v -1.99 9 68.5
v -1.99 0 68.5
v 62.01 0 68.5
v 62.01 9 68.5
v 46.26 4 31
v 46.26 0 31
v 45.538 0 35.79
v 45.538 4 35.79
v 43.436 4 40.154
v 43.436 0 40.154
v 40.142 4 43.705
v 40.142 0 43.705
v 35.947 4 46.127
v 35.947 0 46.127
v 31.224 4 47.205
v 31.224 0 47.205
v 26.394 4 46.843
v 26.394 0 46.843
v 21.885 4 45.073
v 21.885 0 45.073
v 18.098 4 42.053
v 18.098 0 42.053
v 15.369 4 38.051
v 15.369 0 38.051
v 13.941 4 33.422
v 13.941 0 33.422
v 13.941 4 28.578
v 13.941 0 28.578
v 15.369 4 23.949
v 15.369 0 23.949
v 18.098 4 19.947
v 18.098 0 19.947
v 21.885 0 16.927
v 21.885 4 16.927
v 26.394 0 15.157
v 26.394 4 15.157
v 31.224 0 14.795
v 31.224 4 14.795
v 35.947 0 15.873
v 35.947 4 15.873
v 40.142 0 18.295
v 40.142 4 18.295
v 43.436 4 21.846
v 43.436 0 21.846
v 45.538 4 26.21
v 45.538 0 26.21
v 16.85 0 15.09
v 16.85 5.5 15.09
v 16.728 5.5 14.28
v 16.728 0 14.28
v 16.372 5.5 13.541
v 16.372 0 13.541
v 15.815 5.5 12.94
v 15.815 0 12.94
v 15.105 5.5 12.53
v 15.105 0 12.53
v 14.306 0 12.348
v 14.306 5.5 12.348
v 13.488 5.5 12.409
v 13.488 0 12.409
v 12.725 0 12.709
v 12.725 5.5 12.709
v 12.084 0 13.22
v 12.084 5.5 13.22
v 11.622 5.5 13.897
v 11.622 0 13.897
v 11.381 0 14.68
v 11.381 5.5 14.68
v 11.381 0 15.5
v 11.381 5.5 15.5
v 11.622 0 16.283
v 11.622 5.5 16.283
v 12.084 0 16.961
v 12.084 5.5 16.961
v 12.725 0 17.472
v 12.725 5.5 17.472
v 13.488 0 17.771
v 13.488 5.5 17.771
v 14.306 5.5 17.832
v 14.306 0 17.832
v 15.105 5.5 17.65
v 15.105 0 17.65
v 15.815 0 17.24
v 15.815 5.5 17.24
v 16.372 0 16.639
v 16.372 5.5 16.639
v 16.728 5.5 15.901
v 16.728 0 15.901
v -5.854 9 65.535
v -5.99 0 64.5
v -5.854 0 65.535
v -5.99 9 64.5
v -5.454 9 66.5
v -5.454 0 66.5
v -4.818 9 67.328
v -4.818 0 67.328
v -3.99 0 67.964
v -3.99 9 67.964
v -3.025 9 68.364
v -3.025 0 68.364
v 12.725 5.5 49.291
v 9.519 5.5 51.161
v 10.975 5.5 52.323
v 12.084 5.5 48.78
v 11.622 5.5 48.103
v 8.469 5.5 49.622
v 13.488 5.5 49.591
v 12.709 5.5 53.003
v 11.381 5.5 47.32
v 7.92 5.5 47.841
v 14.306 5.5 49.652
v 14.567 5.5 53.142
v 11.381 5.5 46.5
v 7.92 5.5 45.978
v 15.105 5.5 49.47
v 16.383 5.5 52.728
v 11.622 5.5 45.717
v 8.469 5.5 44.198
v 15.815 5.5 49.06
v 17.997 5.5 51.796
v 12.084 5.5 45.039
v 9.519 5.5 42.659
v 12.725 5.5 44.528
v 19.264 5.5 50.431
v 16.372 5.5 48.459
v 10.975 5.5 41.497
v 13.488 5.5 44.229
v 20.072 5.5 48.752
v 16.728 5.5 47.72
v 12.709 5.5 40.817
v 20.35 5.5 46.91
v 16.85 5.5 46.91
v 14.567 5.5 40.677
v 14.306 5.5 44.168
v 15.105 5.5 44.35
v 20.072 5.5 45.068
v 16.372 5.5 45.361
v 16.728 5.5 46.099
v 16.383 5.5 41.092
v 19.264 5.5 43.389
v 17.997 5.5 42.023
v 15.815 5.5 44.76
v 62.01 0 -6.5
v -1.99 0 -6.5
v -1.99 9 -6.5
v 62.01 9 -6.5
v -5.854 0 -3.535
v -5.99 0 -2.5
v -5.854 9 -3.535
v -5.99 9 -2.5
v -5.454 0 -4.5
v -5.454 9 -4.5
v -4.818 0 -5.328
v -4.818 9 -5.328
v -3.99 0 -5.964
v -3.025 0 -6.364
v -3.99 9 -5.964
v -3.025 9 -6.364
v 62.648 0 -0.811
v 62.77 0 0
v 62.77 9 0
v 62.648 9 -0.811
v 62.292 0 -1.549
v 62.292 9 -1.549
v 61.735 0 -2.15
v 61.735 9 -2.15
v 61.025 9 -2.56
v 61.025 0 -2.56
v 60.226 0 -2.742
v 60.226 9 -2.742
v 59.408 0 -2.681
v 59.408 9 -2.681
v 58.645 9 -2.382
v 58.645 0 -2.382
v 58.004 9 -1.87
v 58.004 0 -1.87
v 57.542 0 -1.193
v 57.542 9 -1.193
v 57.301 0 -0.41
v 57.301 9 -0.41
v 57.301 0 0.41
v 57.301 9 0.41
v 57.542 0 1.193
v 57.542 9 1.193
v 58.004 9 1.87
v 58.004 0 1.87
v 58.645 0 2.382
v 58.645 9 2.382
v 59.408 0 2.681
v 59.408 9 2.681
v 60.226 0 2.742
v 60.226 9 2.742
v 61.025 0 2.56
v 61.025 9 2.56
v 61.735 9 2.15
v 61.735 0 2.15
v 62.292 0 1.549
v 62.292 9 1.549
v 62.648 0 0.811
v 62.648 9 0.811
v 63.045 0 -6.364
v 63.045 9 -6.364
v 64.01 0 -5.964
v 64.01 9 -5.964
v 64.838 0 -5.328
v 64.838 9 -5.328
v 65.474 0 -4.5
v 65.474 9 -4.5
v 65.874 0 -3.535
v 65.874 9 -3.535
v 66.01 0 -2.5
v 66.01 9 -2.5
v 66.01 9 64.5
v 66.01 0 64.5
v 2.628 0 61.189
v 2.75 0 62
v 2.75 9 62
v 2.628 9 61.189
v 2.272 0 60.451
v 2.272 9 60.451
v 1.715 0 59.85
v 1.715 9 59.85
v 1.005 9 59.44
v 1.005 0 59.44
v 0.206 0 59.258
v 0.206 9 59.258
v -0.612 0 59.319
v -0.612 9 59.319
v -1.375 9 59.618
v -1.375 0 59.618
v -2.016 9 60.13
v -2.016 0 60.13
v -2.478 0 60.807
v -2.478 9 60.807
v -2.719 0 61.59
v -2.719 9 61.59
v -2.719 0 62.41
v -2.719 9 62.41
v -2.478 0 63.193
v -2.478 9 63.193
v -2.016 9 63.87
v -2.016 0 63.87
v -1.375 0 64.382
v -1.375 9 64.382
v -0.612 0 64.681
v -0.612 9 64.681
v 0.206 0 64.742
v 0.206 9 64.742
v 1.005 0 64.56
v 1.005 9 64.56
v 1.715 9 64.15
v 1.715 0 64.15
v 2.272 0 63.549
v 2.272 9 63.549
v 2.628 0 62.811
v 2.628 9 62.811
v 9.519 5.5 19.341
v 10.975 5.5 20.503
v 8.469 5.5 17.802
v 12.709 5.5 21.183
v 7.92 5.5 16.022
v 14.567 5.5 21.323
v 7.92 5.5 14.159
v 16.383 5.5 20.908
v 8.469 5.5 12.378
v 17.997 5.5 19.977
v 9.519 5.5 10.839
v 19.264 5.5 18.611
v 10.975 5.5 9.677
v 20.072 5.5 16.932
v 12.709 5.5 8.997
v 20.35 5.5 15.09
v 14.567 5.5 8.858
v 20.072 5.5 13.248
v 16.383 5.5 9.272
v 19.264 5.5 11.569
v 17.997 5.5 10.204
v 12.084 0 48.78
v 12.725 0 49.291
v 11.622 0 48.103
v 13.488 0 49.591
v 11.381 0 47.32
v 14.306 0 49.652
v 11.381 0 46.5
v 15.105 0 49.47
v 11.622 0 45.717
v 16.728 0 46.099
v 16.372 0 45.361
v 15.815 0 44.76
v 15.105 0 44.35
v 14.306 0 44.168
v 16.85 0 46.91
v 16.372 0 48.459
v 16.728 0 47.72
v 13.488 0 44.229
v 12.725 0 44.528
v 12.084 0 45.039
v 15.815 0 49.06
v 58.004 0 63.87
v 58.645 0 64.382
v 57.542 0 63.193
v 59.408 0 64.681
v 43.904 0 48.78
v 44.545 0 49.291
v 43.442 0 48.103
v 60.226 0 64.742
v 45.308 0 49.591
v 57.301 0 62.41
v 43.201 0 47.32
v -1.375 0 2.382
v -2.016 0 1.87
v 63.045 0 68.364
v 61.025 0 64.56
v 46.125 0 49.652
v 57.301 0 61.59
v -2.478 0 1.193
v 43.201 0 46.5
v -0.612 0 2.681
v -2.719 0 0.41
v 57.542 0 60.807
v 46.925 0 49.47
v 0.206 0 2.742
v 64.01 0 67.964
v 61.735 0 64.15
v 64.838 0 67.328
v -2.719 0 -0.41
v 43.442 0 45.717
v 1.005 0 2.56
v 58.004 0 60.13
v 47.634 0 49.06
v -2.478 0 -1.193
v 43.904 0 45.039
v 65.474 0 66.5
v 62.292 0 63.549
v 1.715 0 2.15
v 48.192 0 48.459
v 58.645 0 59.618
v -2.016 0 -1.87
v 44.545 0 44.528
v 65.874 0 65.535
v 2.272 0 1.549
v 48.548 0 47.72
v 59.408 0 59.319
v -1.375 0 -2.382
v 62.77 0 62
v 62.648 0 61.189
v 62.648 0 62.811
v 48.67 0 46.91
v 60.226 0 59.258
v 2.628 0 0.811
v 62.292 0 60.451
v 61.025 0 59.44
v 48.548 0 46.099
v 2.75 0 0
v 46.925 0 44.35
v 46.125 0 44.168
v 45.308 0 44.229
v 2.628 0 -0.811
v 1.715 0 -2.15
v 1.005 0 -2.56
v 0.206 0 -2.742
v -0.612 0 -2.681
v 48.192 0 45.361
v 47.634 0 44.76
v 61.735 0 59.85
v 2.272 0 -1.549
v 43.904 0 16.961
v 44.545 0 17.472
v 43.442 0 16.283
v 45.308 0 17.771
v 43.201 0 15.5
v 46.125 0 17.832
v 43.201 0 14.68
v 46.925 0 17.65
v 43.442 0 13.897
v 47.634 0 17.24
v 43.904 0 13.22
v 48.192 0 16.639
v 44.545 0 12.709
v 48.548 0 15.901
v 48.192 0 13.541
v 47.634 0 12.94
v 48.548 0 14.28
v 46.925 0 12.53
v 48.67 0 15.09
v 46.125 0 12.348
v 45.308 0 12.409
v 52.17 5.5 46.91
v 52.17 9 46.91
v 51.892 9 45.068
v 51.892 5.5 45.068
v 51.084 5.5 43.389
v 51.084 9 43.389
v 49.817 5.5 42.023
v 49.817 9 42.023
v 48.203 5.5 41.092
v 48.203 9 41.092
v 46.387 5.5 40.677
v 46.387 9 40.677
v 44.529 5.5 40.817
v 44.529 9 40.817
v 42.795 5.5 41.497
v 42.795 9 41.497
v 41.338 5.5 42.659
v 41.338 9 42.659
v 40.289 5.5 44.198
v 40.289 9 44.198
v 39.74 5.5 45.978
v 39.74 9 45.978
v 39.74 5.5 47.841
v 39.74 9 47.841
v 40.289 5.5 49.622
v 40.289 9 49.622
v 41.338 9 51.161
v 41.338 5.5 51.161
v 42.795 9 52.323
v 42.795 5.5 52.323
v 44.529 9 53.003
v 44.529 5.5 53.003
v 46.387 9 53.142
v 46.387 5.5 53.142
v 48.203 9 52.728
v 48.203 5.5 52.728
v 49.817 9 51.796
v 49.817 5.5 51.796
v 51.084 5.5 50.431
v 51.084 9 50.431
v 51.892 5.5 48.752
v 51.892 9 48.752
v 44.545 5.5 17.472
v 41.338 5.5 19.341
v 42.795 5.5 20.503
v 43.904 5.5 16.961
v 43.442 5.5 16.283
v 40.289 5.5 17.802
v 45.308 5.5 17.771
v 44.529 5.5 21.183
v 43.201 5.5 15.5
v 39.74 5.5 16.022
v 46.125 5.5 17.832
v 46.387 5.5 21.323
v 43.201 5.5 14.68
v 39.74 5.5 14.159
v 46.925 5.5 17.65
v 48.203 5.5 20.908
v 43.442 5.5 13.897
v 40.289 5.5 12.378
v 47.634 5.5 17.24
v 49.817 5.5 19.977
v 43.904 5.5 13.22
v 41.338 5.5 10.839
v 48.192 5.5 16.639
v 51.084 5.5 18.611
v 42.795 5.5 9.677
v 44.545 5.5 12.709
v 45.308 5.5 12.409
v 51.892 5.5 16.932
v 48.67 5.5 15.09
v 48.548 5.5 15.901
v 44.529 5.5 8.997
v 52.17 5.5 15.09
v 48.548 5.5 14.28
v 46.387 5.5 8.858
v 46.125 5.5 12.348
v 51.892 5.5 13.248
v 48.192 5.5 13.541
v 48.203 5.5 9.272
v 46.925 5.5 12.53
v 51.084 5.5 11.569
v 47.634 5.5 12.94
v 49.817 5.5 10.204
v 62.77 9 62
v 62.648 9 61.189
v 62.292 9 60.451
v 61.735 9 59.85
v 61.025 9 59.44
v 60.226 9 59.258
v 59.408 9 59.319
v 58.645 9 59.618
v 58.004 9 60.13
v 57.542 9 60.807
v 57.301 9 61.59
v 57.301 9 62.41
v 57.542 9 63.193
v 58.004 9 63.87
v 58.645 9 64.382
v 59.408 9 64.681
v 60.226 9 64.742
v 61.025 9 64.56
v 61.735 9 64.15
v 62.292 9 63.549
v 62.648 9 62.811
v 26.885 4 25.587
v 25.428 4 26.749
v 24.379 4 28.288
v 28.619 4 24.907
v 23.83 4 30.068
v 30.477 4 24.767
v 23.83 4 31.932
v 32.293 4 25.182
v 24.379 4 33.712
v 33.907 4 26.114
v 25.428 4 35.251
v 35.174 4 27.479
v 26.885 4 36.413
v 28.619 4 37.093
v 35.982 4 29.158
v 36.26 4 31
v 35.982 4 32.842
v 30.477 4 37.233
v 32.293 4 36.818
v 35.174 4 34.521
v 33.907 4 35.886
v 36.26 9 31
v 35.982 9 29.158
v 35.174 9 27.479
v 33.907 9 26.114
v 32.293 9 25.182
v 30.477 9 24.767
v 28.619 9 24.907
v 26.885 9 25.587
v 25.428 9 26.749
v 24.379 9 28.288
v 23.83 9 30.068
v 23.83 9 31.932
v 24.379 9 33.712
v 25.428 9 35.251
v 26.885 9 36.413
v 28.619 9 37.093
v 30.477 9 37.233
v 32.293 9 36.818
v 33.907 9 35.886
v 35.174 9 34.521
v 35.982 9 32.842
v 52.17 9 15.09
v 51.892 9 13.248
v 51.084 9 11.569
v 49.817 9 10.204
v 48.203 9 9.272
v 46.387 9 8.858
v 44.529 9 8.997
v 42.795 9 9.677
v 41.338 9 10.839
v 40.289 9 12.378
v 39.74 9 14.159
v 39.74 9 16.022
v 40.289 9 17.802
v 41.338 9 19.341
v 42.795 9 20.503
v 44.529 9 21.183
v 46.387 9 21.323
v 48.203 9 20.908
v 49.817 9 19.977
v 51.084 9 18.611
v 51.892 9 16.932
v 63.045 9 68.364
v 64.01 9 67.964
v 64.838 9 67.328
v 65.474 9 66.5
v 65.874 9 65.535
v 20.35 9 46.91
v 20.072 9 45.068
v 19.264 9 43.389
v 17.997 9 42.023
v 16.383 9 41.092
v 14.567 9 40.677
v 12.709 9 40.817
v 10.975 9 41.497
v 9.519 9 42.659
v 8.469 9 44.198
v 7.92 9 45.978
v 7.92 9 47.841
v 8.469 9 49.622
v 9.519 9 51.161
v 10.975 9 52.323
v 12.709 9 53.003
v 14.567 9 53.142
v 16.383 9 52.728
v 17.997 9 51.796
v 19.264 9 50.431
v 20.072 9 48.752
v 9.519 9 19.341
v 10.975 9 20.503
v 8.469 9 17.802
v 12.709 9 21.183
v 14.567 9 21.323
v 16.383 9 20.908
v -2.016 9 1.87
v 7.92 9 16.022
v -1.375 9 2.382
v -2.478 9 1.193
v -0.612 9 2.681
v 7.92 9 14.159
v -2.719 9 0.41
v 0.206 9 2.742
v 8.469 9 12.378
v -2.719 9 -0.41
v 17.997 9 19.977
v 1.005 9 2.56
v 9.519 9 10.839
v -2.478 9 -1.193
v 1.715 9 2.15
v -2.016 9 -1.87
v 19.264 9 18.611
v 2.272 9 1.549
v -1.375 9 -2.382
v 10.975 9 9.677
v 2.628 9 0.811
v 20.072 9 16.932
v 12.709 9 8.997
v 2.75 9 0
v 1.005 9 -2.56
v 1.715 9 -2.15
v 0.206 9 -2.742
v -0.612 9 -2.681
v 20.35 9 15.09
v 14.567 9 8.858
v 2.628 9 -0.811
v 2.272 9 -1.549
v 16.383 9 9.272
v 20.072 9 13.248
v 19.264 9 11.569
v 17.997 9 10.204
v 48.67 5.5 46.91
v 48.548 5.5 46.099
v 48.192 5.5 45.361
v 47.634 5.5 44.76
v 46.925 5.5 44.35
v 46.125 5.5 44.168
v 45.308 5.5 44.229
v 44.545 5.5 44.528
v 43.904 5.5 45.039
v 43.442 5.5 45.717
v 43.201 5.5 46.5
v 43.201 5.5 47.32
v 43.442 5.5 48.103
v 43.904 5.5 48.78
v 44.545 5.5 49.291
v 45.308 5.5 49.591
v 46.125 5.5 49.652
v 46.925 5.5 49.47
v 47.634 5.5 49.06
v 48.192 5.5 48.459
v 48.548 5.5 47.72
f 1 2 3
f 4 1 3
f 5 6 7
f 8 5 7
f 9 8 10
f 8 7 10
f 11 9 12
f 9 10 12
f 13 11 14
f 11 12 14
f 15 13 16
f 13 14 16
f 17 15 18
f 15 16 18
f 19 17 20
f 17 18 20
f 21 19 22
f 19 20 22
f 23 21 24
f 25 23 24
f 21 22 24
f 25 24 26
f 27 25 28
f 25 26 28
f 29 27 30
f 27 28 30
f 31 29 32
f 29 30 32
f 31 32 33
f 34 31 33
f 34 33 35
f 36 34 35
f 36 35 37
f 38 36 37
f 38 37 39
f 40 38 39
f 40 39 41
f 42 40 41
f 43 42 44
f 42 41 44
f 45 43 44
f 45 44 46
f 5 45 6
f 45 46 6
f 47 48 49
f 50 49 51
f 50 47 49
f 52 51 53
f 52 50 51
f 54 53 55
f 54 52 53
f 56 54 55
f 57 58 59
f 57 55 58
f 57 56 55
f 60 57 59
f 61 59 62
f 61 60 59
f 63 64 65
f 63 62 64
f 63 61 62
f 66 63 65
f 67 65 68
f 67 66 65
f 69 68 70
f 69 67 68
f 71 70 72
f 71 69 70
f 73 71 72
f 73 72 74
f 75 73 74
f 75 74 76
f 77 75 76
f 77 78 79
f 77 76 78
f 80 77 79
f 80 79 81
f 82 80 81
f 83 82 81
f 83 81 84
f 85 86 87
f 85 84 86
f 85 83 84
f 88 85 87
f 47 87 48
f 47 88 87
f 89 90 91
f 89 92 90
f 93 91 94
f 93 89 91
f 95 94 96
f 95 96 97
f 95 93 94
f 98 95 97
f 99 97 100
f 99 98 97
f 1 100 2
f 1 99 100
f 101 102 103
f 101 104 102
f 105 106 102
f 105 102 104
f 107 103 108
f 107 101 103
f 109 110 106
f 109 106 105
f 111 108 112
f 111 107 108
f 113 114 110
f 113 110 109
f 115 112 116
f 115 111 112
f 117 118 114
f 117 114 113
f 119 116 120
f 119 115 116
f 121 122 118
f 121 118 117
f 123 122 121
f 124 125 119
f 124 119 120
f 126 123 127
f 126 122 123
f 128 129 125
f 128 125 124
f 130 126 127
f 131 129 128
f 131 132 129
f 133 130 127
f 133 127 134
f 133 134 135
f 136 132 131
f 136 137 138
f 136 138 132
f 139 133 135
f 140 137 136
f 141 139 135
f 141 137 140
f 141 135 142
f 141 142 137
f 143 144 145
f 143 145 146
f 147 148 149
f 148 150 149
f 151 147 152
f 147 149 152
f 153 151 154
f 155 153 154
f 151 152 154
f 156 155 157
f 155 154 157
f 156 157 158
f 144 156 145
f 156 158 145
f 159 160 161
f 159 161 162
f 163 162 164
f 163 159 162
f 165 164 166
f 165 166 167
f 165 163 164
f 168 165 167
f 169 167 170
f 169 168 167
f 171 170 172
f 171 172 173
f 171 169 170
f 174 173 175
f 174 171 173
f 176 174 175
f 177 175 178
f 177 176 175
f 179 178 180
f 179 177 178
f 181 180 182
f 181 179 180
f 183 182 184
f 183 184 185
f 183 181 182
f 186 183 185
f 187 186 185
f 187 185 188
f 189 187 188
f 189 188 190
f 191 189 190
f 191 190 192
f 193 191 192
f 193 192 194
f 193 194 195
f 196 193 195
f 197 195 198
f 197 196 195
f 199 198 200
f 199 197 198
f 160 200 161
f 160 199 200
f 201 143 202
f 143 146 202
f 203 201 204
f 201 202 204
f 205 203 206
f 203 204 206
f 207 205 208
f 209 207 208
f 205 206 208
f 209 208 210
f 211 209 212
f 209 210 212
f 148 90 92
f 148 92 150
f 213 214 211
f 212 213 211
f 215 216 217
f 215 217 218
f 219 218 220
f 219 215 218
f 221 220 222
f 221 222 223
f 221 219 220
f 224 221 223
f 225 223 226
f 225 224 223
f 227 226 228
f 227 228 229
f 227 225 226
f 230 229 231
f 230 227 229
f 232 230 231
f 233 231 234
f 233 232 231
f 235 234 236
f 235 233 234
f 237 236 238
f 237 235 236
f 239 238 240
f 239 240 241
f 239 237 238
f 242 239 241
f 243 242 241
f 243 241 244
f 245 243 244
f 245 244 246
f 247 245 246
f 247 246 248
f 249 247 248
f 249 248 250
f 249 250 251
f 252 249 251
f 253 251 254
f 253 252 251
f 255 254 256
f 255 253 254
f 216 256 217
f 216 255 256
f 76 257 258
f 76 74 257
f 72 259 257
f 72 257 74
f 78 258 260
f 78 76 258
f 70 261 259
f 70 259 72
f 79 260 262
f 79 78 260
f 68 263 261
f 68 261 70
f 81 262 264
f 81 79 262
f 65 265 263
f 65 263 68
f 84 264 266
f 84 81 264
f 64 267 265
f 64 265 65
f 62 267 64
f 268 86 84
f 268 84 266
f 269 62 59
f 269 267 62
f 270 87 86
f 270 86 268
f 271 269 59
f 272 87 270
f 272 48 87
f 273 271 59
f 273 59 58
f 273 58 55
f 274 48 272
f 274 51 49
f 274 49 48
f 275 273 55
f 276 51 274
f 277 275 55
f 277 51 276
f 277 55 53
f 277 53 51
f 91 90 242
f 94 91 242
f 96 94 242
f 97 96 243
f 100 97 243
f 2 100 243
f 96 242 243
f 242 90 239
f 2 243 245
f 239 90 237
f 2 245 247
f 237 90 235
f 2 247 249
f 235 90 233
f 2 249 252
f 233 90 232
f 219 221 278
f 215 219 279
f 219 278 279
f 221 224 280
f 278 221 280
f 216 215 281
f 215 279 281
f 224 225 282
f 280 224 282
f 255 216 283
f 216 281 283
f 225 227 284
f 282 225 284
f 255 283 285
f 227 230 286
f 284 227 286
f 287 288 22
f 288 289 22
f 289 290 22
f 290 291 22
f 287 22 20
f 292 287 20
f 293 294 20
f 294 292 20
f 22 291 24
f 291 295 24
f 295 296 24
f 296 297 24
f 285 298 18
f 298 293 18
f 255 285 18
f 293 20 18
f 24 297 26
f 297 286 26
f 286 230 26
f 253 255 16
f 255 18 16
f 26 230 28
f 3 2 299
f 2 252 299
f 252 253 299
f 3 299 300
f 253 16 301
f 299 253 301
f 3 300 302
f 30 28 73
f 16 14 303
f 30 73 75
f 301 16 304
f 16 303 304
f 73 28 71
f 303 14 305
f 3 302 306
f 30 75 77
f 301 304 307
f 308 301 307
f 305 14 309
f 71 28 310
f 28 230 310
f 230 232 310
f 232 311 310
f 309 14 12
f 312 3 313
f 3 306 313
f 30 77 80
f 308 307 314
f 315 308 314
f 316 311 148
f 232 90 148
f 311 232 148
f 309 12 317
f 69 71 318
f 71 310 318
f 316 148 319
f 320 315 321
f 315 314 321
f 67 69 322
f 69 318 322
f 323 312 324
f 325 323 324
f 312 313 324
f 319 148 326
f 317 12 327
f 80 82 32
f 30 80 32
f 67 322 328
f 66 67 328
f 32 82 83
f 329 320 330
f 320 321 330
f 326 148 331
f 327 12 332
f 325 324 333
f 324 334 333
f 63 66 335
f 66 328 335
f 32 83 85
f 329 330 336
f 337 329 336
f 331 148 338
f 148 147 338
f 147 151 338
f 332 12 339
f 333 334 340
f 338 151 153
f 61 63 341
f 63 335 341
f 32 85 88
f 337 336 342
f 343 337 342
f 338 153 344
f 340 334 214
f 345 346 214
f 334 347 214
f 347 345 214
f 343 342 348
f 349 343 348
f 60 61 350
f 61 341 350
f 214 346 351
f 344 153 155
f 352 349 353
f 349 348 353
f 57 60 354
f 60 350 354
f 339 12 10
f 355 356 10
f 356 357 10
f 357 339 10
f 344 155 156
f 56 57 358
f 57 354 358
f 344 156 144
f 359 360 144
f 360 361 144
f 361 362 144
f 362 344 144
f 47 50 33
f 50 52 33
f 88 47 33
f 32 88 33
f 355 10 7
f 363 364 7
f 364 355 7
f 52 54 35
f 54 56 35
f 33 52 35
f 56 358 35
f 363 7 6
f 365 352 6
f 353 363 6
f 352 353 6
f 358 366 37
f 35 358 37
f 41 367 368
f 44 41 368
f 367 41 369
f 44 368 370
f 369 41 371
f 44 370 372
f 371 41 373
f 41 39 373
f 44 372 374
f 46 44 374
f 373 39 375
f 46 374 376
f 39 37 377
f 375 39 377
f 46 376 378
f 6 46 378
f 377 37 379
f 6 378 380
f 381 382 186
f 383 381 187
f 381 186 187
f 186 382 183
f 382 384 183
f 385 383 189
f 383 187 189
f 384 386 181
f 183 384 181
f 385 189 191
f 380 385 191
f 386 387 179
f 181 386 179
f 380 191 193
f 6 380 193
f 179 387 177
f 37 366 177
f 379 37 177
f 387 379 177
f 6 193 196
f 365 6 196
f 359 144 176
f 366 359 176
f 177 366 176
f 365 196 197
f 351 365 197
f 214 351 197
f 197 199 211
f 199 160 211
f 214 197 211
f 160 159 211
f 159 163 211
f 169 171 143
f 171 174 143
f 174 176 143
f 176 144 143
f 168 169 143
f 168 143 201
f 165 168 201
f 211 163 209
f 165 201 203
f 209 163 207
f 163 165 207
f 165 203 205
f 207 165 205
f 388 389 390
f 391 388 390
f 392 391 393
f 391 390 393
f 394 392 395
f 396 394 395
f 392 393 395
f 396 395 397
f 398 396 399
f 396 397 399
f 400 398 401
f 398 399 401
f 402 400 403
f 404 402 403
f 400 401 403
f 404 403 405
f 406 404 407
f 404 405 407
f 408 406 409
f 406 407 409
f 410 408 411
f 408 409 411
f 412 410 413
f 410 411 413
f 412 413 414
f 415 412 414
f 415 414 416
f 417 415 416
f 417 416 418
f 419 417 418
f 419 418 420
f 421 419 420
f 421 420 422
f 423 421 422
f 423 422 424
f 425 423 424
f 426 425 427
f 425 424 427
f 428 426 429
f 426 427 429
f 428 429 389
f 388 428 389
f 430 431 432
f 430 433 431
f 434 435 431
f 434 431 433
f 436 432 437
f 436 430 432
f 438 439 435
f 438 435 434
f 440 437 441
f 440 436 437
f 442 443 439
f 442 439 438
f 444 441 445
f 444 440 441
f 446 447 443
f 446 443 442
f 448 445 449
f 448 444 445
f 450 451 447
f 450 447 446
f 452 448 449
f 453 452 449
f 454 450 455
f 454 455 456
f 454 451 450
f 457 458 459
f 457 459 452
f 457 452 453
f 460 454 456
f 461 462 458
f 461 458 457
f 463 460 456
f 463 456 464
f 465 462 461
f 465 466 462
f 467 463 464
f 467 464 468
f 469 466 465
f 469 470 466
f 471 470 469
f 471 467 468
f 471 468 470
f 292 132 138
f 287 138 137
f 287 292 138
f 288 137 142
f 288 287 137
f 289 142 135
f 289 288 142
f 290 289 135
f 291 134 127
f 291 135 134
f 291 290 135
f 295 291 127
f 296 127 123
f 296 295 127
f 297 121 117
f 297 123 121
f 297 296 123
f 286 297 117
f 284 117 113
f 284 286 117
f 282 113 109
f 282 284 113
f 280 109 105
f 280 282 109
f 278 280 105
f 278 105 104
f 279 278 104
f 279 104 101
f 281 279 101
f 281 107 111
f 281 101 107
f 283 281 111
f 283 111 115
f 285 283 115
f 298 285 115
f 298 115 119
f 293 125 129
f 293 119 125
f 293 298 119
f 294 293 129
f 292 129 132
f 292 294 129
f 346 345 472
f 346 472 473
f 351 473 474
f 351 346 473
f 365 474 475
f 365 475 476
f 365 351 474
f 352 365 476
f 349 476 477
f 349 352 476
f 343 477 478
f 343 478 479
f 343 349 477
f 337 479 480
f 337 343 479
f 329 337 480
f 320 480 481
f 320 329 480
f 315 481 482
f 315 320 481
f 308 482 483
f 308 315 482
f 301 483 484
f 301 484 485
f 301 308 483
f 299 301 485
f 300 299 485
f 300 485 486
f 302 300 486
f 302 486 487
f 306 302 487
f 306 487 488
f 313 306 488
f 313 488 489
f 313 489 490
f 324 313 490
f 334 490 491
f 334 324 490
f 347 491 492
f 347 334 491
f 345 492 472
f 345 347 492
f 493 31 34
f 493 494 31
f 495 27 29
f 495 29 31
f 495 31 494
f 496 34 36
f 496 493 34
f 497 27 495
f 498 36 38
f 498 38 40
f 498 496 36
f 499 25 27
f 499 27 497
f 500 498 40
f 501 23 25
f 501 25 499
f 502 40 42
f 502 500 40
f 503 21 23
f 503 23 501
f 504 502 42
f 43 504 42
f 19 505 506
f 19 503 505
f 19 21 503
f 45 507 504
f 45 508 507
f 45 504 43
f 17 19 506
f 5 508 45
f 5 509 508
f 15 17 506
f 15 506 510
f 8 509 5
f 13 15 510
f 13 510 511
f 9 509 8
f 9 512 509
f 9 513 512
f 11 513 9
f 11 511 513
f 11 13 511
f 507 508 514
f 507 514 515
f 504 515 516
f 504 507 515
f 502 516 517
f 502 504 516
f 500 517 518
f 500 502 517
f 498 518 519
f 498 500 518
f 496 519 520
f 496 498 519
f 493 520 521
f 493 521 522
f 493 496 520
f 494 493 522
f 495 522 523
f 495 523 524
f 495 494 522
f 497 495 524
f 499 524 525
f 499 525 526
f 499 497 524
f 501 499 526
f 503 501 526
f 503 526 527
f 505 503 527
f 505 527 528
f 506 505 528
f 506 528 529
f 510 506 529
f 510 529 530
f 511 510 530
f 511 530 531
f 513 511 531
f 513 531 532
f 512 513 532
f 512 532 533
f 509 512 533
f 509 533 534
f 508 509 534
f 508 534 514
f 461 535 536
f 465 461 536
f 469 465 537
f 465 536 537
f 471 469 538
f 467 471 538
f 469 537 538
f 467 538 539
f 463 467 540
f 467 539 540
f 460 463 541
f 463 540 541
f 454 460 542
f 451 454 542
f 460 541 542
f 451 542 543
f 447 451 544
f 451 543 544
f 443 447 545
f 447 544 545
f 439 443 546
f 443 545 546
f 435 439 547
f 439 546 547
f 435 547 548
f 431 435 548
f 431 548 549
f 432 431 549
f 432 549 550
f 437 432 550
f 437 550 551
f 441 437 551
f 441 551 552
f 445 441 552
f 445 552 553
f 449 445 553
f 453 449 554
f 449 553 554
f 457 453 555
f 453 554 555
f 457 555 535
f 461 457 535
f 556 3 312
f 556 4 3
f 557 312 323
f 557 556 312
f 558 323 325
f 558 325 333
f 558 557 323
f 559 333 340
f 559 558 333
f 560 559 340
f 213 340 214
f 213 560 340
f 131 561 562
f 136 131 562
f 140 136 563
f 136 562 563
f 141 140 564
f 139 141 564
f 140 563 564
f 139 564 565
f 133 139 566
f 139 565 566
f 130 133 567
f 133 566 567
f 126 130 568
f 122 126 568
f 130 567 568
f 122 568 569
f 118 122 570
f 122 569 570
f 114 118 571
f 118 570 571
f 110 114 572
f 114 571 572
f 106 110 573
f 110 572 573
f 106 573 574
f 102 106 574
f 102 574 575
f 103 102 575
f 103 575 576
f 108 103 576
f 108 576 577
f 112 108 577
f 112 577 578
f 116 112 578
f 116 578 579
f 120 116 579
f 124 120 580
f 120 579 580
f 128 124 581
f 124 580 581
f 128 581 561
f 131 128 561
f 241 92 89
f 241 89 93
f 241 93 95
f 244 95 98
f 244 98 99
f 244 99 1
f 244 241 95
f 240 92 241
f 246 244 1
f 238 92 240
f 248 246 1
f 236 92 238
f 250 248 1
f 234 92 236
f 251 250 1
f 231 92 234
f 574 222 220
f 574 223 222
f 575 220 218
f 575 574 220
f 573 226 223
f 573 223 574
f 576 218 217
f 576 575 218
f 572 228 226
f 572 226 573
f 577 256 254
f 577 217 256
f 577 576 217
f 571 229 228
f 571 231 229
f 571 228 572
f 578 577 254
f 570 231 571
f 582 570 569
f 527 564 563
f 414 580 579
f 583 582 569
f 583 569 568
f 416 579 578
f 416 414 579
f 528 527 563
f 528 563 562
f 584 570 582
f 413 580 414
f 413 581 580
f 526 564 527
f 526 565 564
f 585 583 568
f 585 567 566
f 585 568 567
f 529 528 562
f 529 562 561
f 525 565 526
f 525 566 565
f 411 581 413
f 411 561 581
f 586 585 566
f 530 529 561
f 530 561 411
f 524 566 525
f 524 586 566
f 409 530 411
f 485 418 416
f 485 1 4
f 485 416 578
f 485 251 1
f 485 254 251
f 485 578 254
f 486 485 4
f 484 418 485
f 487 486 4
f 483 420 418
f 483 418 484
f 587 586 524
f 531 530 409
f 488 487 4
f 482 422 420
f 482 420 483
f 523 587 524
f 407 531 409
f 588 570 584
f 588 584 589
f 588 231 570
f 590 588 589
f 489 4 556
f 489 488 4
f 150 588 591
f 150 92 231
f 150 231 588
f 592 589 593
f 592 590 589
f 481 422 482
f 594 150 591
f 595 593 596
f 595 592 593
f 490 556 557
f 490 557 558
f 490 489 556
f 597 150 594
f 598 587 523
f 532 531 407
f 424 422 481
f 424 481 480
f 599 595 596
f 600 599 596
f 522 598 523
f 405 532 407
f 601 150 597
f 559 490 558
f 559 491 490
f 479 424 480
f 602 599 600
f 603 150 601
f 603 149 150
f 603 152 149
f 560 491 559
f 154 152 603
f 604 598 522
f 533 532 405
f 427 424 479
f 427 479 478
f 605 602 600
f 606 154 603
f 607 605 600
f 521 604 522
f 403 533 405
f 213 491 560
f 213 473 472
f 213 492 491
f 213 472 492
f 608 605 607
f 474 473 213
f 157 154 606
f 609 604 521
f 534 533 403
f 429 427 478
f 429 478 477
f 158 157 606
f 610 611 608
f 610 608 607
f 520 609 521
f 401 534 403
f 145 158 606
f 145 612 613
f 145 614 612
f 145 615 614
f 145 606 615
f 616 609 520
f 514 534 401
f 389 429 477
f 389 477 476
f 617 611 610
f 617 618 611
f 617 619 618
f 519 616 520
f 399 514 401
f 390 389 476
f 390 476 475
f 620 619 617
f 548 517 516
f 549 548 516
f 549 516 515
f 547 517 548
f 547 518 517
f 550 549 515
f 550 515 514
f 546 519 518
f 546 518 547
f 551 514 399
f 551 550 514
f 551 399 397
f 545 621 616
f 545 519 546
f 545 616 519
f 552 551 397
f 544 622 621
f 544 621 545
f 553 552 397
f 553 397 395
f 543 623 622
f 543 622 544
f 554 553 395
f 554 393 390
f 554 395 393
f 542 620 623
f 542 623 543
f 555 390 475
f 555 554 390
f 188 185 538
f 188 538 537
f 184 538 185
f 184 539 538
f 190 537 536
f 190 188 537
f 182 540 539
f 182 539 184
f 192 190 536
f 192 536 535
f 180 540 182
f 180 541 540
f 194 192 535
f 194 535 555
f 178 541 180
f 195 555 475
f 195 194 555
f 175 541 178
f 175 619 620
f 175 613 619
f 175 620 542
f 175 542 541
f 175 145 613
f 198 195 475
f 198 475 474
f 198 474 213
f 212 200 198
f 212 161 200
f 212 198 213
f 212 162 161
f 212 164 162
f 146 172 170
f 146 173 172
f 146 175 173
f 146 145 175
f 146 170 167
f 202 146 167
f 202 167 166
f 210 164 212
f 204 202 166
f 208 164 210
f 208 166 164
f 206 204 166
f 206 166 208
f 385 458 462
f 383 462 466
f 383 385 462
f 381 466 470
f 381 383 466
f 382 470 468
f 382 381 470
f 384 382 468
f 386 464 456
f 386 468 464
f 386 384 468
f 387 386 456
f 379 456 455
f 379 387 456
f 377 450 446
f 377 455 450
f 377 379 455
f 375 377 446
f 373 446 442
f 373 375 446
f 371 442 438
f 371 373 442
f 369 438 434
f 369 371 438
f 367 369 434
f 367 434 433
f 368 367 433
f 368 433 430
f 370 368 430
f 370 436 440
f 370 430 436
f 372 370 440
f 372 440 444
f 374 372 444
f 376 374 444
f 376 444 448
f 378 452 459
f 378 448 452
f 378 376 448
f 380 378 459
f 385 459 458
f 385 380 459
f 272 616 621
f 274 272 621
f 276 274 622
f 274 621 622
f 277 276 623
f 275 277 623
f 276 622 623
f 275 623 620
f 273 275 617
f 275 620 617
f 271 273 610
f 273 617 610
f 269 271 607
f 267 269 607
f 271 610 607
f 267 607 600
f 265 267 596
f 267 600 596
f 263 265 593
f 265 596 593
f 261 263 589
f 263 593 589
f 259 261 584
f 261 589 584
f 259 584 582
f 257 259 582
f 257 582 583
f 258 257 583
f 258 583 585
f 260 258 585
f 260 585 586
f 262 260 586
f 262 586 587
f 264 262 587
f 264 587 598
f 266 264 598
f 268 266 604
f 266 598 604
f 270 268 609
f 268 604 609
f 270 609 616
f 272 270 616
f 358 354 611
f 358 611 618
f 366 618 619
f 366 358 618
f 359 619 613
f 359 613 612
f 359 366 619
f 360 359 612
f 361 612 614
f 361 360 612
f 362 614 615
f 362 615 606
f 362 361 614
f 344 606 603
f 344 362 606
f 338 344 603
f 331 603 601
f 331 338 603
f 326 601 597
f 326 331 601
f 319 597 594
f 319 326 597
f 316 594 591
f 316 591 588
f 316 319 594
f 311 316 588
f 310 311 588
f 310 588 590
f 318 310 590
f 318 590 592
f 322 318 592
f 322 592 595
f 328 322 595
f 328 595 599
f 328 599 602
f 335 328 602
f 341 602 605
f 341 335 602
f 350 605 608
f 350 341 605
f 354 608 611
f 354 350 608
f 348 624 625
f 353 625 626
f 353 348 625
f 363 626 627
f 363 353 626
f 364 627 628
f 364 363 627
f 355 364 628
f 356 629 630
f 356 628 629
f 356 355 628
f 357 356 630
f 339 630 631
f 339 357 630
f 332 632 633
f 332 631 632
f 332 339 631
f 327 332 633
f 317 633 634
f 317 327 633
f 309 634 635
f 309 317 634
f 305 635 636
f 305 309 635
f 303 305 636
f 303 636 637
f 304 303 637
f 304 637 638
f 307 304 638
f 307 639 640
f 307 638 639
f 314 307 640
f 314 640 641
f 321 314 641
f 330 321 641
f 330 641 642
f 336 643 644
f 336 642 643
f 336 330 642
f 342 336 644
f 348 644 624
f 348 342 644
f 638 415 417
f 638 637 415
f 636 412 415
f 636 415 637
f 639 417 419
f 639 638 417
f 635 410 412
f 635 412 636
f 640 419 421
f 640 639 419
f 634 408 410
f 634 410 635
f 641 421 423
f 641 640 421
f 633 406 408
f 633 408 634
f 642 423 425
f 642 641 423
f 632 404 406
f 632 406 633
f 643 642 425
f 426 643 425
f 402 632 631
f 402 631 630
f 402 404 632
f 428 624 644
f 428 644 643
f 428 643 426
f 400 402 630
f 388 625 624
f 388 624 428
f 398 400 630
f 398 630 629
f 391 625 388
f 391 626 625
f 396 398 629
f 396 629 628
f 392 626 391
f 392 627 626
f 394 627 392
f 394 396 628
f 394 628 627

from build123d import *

# Parameters (mm, degrees)
SKETCH1_W           = 72
SKETCH1_H           = 75
SKETCH1_R           = 2.75
SKETCH1_R_2         = 6.25
BOSS_EXTRUDE3_DEPTH = 9
FILLET1_R           = 4
SKETCH4_R           = 16.25
CUT_EXTRUDE2_DEPTH  = 4
SKETCH3_R           = 6.25
CUT_EXTRUDE3_DEPTH  = 3.5


with BuildPart() as part:
    # Sketch1 → Boss-Extrude3 (new body)
    with BuildSketch(Plane(origin=(0, 0, 0), x_dir=(1, 0, 0), z_dir=(0, 1, 0))):
        with Locations((30.01, -31)):
            Rectangle(SKETCH1_W, SKETCH1_H)
        Circle(SKETCH1_R, mode=Mode.SUBTRACT)
        with Locations((60.02, 0)):
            Circle(SKETCH1_R, mode=Mode.SUBTRACT)
        with Locations((60.02, -62)):
            Circle(SKETCH1_R, mode=Mode.SUBTRACT)
        with Locations((0, -62)):
            Circle(SKETCH1_R, mode=Mode.SUBTRACT)
        with Locations((30.01, -31)):
            Circle(SKETCH1_R_2, mode=Mode.SUBTRACT)
        with Locations((14.100097423, -15.090097423)):
            Circle(SKETCH1_R, mode=Mode.SUBTRACT)
        with Locations((14.100097423, -46.909902577)):
            Circle(SKETCH1_R, mode=Mode.SUBTRACT)
        with Locations((45.919902577, -46.909902577)):
            Circle(SKETCH1_R, mode=Mode.SUBTRACT)
        with Locations((45.919902577, -15.090097423)):
            Circle(SKETCH1_R, mode=Mode.SUBTRACT)
    extrude(amount=BOSS_EXTRUDE3_DEPTH)

    # Fillet1
    fillet1_edges = [part.edges().sort_by_distance(p)[0] for p in [
        (66.01, 4.5, 68.5),
        (-5.99, 4.5, 68.5),
        (-5.99, 4.5, -6.5),
        (66.01, 4.5, -6.5),
    ]]
    fillet(fillet1_edges, radius=FILLET1_R)

    # Sketch4 → Cut-Extrude2 (cut)
    with BuildSketch(Plane.XZ):
        with Locations((30.01, 31)):
            Circle(SKETCH4_R)
    extrude(amount=-CUT_EXTRUDE2_DEPTH, mode=Mode.SUBTRACT)

    # Sketch3 → Cut-Extrude3 (cut)
    with BuildSketch(Plane(origin=(0, 9, 0), x_dir=(1, 0, 0), z_dir=(0, 1, 0))):
        with Locations((14.100097423, -46.909902577)):
            Circle(SKETCH3_R)
        with Locations((14.100097423, -15.090097423)):
            Circle(SKETCH3_R)
        with Locations((45.919902577, -15.090097423)):
            Circle(SKETCH3_R)
        with Locations((45.919902577, -46.909902577)):
            Circle(SKETCH3_R)
    extrude(amount=-CUT_EXTRUDE3_DEPTH, mode=Mode.SUBTRACT)


solid = part.part
